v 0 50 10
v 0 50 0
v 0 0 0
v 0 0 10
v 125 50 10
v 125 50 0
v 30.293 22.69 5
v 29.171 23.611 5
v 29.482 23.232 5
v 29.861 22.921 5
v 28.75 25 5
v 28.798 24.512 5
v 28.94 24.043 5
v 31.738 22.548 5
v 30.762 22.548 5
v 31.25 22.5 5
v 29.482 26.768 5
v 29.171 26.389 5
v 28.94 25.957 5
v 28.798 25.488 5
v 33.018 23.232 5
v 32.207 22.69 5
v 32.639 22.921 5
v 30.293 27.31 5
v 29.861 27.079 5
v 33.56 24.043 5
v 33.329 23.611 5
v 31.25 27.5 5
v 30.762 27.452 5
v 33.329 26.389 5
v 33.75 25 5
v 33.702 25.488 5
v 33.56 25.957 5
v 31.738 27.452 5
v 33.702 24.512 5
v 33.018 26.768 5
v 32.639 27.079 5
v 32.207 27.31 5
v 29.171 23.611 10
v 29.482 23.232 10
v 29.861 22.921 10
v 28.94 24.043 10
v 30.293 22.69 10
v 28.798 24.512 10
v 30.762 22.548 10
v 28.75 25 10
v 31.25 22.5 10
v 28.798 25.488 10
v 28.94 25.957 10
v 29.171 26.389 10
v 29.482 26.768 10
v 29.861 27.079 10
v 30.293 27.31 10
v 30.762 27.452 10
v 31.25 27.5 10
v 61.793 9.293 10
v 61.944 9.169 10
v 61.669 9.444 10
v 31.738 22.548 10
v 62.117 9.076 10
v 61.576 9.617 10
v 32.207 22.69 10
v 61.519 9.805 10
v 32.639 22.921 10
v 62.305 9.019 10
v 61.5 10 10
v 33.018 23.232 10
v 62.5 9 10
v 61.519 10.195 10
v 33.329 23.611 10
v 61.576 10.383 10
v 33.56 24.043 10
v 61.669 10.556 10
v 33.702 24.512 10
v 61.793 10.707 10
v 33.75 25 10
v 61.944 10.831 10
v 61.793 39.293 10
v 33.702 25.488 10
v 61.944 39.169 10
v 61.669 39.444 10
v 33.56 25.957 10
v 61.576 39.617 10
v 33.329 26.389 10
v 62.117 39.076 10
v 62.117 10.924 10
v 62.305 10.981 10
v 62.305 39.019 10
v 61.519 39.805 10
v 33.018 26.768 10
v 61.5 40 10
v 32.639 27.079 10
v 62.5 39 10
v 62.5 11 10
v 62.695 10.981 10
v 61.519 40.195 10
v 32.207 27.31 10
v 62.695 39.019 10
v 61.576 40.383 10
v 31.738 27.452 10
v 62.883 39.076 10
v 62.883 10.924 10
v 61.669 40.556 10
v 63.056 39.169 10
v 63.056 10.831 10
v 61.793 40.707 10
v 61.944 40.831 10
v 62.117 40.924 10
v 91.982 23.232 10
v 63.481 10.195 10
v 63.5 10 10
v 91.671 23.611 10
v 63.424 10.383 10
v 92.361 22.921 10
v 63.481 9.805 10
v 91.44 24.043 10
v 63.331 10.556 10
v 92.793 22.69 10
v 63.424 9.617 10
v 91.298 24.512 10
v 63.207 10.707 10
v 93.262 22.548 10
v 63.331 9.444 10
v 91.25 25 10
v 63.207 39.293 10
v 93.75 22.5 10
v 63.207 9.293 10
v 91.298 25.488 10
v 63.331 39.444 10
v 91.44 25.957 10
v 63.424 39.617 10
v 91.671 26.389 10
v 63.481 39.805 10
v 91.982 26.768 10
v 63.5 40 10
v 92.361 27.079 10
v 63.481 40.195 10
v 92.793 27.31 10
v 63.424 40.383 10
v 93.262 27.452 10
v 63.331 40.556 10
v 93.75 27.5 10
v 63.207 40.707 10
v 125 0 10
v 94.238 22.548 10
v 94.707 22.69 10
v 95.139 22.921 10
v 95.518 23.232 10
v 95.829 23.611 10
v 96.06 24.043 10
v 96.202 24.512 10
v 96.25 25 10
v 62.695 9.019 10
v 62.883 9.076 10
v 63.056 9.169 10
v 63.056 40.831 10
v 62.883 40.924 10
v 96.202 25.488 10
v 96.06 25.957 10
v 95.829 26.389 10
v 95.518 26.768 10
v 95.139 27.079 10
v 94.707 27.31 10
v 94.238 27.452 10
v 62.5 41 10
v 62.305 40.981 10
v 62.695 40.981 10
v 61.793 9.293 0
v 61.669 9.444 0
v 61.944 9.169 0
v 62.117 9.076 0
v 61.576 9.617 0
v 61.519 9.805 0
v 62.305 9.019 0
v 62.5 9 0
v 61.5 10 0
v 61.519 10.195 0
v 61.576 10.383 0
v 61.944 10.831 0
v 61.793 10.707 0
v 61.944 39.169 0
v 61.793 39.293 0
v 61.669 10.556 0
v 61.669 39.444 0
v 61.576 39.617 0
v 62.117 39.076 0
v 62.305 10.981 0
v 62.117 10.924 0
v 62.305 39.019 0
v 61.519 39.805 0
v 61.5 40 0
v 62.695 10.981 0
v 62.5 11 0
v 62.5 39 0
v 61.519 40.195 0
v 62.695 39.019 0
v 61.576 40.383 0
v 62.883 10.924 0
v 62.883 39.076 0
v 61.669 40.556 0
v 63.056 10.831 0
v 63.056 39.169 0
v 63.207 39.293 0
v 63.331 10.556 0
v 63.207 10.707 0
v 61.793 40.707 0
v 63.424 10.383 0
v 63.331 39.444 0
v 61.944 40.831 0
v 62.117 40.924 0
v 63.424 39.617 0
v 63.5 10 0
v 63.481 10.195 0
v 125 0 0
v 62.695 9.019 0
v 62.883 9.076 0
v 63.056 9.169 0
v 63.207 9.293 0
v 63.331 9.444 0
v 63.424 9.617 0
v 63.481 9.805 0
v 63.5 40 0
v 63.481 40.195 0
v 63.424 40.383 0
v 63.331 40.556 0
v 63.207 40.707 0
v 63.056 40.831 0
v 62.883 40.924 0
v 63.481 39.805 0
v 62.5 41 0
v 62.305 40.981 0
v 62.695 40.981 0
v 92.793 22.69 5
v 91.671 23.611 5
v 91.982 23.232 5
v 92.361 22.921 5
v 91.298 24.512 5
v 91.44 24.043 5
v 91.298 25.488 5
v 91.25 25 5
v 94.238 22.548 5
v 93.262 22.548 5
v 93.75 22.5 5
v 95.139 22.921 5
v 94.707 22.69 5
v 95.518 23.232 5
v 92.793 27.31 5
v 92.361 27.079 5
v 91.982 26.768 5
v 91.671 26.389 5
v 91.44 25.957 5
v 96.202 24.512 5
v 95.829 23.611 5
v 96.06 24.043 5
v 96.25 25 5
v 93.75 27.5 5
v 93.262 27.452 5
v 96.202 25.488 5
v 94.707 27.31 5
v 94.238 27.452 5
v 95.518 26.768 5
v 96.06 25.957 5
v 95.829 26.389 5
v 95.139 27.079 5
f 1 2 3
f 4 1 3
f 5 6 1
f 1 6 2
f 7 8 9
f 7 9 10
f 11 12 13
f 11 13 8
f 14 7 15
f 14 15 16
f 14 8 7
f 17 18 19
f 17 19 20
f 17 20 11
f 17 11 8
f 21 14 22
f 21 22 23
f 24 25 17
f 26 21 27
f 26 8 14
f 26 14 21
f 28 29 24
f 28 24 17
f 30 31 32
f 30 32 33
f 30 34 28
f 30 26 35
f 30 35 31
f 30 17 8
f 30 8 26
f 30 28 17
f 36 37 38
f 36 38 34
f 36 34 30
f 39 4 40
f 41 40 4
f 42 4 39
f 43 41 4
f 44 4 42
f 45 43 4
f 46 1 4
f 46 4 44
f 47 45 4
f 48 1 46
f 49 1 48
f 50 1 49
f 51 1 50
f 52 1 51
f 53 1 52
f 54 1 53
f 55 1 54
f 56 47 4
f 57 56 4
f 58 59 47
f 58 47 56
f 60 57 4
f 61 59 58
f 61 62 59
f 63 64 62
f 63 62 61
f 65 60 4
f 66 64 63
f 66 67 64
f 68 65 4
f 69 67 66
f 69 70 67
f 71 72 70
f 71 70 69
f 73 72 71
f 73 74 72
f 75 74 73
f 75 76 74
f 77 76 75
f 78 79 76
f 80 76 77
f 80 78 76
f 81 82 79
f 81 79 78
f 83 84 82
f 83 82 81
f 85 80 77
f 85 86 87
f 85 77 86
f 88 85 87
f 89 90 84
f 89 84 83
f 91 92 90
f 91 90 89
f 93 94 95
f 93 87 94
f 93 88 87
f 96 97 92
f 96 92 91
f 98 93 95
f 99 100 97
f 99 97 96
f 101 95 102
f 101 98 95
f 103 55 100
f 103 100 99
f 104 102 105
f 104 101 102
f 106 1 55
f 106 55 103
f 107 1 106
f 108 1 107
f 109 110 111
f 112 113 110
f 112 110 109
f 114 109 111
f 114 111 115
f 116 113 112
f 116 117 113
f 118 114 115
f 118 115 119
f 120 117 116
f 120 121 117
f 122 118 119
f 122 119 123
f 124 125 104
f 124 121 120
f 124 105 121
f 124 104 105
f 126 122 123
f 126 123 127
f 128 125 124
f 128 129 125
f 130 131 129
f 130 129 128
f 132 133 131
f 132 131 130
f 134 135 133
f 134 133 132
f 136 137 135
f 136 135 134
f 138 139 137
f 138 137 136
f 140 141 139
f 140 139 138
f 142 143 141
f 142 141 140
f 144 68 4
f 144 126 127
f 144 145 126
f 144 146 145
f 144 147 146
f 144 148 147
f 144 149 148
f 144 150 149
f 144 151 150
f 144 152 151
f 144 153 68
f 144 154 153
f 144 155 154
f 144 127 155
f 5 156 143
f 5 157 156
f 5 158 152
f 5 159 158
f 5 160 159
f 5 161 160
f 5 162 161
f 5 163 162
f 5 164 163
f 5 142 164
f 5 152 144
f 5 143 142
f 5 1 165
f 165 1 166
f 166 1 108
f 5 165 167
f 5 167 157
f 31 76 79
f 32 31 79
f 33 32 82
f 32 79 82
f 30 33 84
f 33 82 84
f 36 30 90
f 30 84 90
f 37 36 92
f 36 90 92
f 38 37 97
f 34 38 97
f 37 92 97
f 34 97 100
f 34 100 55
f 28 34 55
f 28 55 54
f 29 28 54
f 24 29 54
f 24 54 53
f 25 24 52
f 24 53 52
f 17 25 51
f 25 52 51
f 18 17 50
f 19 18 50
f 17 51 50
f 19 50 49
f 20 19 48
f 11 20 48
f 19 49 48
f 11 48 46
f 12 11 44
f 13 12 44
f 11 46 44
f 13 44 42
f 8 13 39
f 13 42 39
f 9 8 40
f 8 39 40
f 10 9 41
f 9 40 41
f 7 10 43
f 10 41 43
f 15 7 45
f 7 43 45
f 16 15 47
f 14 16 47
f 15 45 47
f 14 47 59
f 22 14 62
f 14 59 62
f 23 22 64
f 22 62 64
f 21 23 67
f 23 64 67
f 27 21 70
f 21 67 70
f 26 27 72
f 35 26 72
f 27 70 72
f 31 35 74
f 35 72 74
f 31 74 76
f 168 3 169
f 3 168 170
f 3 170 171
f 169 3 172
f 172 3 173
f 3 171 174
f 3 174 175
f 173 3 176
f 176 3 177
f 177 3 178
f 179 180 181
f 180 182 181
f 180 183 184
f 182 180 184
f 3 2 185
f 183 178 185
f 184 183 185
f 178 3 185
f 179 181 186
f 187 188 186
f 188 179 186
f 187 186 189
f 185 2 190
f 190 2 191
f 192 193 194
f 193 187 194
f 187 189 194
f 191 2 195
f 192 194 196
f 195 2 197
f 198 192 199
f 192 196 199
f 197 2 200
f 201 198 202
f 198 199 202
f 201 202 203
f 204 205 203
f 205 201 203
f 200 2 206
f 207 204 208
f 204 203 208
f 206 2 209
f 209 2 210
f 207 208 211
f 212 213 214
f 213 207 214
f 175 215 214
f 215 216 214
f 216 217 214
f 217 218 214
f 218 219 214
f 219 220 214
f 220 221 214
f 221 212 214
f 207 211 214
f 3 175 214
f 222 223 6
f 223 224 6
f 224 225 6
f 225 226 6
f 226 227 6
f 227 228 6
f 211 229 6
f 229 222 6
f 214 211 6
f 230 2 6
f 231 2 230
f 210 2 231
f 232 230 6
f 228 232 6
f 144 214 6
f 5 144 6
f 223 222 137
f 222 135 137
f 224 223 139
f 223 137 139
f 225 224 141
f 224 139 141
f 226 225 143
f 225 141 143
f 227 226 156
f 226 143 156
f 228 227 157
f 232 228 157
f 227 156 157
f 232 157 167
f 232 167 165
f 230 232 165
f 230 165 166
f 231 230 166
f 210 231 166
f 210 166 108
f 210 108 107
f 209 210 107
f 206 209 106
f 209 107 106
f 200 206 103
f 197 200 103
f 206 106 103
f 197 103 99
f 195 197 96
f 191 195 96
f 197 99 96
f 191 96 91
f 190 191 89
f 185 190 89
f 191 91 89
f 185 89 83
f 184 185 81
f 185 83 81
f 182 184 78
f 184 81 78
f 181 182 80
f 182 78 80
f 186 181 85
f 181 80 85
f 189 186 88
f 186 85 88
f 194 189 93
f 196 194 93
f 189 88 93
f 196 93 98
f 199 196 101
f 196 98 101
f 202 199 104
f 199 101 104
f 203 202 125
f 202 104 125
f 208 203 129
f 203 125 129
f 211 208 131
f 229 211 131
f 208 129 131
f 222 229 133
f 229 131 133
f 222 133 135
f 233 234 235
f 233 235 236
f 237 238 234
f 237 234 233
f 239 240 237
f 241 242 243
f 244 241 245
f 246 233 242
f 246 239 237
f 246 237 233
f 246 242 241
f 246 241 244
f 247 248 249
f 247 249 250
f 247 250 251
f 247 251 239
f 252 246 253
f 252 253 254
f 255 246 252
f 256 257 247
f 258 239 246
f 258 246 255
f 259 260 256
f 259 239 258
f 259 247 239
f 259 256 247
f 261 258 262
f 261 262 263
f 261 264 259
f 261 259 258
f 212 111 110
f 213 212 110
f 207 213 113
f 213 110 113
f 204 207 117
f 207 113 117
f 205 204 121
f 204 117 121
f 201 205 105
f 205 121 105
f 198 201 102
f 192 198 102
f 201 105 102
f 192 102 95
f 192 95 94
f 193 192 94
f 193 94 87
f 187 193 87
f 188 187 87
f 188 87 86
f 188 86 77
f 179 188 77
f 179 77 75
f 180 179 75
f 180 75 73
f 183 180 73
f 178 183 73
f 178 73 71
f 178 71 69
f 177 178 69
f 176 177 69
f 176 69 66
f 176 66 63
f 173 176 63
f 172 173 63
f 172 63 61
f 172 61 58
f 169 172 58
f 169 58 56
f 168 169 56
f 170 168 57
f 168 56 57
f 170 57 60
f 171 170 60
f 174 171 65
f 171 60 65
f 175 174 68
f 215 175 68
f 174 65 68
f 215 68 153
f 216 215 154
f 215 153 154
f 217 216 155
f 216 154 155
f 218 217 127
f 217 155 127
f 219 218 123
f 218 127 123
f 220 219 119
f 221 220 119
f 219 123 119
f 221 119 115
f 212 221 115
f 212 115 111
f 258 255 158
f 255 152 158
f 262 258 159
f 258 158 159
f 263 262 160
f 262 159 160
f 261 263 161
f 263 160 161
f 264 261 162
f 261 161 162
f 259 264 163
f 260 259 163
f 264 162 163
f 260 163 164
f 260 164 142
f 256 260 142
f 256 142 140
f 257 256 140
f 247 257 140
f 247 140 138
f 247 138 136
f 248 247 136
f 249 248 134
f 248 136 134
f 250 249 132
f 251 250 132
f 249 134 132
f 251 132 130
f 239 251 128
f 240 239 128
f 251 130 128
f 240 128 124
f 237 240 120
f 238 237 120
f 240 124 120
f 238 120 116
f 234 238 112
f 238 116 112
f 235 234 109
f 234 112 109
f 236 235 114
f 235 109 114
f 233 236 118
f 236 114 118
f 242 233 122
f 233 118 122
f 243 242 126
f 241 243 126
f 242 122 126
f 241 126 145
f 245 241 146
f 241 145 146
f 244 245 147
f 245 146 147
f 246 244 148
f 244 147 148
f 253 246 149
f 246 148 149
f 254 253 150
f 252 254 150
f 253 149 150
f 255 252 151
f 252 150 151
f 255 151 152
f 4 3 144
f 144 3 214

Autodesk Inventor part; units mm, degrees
ref_plane "YZ Plane" through (0, 0, 0) normal (1, 0, 0) x (0, 1, 0)
ref_plane "XZ Plane" through (0, 0, 0) normal (0, 1, 0) x (-1, 0, 0)
ref_plane "XY Plane" through (0, 0, 0) normal (0, 0, 1) x (1, 0, 0)
sketch "Sketch1" plane through (0, 0, 0) normal (0, 0, 1) x (1, 0, 0)
  line L0 (0, 0) -> (125, 0)
  line L1 (125, 0) -> (125, 50)
  line L2 (125, 50) -> (0, 50)
  line L3 (0, 50) -> (0, 0)
  dimension "d0" = 125
  dimension "d1" = 50
extrude "Extrusion1" add sketch "Sketch1" along normal blind 10
sketch "Sketch2" plane through (0, 0, 10) normal (0, 0, 1) x (1, 0, 0)
  circle A0 centre (31.25, 25) radius 2.5
  circle A1 centre (93.75, 25) radius 2.5
  line L0 (125, 50) -> (0, 50) projected
  line L1 (0, 0) -> (125, 0) projected
  line L2 (125, 0) -> (125, 50) projected
  line L3 (0, 50) -> (0, 0) projected
  dimension "d4" = 5
  dimension "d5" = 5
  dimension "d6" = 62.5
  dimension "d7" = 25
  dimension "d8" = 50
  dimension "d9" = 125
  dimension "d10" = 31.25
  dimension "d26" = 25
  dimension "d27" = 31.25
extrude "Extrusion2" cut sketch "Sketch2" against normal blind 5 contours A0 | A1
sketch "Sketch3" plane through (0, 0, 10) normal (0, 0, 1) x (1, 0, 0)
  circle A0 centre (62.5, 40) radius 1
  circle A1 centre (62.5, 10) radius 1
  line L0 (0, 0) -> (125, 0) projected
  line L1 (125, 50) -> (0, 50) projected
  line L2 (125, 0) -> (125, 50) projected
  line L3 (0, 50) -> (0, 0) projected
  dimension "d13" = 2
  dimension "d14" = 2
  dimension "d16" = 50
  dimension "d17" = 10
  dimension "d20" = 125
  dimension "d23" = 62.5
  dimension "d24" = 62.5
  dimension "d25" = 30
extrude "Extrusion3" cut sketch "Sketch3" against normal blind 10 contours A0 | A1
equation "\"d7\" = 0.5 * d8"
equation "\"d10\" = 0.5 * d9 - 0.5 * d6"
equation "\"d26\" = d7"
equation "\"d17\" = 0.5 * d16 - 0.5 * d25"
equation "\"d23\" = 0.5 * d20"
equation "\"d24\" = d23"
equation "\"d15\" = 0.5 * d16"
properties part number "extremite" material "Wood (Oak)"
